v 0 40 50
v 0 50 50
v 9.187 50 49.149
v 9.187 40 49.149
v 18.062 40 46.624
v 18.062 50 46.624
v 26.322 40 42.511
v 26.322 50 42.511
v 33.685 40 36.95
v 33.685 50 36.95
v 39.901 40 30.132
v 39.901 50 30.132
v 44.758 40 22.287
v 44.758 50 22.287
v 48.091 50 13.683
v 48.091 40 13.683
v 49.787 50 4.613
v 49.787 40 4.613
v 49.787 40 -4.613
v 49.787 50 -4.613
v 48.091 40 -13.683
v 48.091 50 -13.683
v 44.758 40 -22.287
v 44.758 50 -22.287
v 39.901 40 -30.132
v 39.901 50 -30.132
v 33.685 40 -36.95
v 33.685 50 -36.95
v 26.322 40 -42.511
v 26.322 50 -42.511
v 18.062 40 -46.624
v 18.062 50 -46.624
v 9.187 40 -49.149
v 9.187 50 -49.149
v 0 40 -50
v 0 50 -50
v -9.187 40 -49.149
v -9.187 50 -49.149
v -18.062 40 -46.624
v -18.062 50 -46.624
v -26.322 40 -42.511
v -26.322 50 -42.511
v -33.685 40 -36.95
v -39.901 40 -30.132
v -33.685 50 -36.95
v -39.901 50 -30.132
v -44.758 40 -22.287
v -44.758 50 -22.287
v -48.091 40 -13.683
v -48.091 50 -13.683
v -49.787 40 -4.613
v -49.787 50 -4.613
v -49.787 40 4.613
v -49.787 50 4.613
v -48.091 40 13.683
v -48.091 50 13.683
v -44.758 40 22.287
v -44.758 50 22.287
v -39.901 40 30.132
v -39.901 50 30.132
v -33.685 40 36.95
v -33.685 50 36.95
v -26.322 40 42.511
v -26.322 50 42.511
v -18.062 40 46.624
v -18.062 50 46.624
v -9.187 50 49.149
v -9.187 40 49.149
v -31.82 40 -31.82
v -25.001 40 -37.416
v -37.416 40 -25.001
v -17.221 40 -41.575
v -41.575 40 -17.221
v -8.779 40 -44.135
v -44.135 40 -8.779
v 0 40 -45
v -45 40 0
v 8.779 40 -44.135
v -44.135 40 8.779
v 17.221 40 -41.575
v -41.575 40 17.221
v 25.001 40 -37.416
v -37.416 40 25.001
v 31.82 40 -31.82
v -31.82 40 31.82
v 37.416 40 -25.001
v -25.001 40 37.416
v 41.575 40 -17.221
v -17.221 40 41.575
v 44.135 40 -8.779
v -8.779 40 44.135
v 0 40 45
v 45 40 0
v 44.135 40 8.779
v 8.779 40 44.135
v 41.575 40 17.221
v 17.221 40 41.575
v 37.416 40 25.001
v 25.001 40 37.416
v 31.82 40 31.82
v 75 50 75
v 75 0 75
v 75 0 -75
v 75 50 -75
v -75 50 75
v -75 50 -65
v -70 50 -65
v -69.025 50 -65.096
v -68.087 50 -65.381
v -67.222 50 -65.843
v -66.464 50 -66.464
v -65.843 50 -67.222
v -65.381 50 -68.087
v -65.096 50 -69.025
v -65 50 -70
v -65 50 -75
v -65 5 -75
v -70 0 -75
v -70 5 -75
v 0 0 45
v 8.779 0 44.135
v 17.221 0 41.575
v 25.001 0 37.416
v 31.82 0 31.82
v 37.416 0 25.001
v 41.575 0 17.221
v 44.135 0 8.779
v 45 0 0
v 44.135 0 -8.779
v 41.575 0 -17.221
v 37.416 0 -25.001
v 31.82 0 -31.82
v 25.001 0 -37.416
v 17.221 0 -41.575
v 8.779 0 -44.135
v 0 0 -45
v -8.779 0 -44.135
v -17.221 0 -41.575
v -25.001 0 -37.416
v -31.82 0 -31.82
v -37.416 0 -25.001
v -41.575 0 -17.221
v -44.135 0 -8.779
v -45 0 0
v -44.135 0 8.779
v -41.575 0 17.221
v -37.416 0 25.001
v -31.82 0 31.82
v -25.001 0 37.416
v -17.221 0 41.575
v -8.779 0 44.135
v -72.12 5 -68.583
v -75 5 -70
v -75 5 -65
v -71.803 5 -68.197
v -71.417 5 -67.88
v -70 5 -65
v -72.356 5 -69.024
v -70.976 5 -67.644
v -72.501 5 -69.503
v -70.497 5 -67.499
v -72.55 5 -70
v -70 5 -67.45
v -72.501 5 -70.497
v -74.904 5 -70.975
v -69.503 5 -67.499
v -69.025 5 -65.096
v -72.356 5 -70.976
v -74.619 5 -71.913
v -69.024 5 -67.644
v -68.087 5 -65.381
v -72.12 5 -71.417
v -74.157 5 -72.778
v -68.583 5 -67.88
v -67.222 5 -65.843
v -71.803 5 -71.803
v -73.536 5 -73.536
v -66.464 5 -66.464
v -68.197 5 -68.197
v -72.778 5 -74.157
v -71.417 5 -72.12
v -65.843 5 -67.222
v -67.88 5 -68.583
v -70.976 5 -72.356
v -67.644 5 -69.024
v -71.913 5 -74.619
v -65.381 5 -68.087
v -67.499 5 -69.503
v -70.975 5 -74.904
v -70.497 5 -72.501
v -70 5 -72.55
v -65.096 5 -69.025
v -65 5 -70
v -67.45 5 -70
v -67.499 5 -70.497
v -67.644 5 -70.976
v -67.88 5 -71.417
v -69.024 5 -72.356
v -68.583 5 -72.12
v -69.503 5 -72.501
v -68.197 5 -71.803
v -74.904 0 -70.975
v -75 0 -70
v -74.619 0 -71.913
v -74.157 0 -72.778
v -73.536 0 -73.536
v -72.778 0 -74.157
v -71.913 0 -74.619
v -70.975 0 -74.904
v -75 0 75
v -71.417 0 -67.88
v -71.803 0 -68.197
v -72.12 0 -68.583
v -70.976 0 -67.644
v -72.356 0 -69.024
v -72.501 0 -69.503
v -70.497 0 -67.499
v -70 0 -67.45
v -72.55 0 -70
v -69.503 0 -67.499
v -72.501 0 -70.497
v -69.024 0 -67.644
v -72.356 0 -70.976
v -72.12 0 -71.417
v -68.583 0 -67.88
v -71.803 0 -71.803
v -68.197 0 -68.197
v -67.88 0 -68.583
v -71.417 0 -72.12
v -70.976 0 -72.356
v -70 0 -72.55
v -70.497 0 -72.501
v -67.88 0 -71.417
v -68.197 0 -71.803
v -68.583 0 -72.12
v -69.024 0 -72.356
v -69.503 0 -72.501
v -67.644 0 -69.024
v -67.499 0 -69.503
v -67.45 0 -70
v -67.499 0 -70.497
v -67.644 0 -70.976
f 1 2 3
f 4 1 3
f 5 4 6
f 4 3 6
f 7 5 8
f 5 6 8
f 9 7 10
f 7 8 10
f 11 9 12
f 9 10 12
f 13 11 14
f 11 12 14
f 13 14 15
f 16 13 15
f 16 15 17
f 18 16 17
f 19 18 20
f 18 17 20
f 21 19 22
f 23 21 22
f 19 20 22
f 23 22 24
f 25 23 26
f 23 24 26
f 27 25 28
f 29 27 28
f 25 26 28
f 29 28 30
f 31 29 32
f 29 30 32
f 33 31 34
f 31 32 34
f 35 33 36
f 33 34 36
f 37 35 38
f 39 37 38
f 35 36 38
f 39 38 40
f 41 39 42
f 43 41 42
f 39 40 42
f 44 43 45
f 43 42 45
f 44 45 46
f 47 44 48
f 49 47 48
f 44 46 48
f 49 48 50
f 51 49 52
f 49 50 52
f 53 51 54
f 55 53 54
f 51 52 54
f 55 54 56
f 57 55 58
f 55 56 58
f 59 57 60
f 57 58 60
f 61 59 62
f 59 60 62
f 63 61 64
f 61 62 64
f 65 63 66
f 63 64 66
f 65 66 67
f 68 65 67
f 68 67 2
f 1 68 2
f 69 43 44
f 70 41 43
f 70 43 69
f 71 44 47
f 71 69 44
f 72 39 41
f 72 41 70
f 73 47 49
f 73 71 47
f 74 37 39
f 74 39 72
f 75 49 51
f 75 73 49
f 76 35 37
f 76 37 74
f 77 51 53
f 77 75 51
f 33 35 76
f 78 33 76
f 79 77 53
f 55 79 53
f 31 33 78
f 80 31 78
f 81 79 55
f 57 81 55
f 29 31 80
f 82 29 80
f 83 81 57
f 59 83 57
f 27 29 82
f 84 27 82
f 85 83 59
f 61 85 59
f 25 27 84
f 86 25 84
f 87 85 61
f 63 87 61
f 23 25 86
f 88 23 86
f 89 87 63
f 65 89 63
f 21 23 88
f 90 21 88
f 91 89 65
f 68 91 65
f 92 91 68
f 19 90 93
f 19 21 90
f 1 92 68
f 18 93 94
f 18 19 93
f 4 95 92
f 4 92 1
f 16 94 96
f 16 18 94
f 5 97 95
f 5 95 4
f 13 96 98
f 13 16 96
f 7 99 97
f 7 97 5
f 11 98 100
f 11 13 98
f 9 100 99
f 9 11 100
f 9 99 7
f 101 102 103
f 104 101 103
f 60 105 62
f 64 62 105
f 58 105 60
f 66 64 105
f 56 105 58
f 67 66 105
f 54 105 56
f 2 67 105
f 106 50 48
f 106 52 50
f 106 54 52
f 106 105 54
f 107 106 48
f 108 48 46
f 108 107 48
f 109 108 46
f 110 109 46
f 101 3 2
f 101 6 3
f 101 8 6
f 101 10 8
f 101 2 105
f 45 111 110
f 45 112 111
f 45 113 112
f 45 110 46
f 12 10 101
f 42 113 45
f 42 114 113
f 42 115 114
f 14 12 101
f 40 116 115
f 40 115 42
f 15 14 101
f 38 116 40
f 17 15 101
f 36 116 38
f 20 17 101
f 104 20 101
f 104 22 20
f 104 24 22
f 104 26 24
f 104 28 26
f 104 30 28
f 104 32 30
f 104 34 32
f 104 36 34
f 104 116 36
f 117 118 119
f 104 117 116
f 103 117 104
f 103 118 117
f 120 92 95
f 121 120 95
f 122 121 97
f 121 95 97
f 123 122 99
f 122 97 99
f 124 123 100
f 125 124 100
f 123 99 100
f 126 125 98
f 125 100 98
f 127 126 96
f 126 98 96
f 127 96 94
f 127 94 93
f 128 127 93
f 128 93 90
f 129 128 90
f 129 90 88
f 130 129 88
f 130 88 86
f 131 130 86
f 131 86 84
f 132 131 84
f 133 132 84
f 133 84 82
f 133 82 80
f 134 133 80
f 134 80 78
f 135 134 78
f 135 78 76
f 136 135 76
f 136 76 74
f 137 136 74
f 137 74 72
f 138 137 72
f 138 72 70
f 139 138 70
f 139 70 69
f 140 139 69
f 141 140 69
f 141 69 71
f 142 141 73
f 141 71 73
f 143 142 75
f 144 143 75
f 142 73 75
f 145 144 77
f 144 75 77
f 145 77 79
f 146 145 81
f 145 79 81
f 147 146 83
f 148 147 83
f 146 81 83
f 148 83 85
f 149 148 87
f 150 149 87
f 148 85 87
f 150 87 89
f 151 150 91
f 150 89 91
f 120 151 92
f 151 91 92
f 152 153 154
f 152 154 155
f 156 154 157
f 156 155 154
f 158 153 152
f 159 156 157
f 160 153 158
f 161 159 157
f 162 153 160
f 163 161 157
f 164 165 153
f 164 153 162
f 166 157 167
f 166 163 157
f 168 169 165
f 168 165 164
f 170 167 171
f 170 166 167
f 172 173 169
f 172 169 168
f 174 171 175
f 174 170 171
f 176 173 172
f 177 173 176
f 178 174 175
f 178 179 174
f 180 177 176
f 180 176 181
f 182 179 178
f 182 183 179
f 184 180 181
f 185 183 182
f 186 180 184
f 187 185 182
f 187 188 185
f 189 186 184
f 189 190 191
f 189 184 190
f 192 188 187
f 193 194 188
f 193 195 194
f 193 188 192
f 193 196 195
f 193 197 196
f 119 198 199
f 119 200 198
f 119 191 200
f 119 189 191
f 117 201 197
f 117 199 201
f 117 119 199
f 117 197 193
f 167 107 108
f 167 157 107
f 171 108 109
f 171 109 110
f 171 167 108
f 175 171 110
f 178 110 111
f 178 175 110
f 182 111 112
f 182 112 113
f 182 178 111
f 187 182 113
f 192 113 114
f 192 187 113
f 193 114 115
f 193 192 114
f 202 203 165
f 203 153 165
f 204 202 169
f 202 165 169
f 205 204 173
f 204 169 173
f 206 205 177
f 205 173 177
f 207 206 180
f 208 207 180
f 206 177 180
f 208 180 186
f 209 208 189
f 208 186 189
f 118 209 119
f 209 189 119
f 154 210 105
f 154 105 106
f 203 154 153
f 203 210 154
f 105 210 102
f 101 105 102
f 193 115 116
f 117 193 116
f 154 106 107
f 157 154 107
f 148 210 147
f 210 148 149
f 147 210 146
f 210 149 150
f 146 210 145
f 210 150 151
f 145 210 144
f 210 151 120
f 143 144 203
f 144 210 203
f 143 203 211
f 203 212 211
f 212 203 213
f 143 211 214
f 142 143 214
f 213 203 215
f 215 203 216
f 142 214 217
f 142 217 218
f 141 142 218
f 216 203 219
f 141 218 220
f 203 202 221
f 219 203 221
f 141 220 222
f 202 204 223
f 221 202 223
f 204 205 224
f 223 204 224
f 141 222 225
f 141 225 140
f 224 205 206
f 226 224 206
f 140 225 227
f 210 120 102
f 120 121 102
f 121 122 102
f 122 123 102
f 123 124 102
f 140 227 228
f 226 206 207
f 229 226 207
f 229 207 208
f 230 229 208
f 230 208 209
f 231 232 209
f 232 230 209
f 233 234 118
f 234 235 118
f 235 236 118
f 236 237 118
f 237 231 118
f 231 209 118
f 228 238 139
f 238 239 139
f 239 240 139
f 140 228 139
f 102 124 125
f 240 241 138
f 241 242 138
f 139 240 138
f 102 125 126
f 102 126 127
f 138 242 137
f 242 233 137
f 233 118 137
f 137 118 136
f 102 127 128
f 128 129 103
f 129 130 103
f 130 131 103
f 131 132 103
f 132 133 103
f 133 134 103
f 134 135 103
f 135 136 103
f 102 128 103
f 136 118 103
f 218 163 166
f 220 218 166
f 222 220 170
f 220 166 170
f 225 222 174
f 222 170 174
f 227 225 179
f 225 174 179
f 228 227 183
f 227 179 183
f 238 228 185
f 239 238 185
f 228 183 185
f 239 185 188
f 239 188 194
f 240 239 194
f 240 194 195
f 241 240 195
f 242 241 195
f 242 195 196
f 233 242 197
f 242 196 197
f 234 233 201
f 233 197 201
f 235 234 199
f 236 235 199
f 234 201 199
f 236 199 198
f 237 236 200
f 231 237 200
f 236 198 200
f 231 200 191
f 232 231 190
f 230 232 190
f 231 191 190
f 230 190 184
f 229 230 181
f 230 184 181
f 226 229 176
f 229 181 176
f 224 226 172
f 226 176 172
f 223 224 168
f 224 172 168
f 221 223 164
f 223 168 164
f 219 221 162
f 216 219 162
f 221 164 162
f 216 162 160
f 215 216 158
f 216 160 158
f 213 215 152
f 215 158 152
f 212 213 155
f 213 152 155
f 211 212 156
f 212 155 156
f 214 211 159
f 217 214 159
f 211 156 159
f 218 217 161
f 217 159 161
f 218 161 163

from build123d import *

# Parameters (mm, degrees)
SKETCH1_W           = 150
SKETCH1_H           = 150
BOSS_EXTRUDE1_DEPTH = 50
SKETCH2_R           = 50
CUT_EXTRUDE1_DEPTH  = 10
SKETCH3_R           = 45
CUT_EXTRUDE2_DEPTH  = 114.357840488
SKETCH4_W           = 10
SKETCH4_H           = 10
CUT_EXTRUDE3_DEPTH  = 45
SKETCH6_R           = 2.55
CUT_EXTRUDE4_DEPTH  = 5
FILLET1_R           = 5


with BuildPart() as part:
    # Sketch1 → Boss-Extrude1 (new body)
    with BuildSketch(Plane(origin=(0, 0, 0), x_dir=(1, 0, 0), z_dir=(0, 1, 0))):
        Rectangle(SKETCH1_W, SKETCH1_H)
    extrude(amount=BOSS_EXTRUDE1_DEPTH)

    # Sketch2 → Cut-Extrude1 (cut)
    with BuildSketch(Plane(origin=(0, 50, 0), x_dir=(1, 0, 0), z_dir=(0, 1, 0))):
        with Locations(Location((0, 0, 0), (0, 0, 270))):
            Circle(SKETCH2_R)
    extrude(amount=-CUT_EXTRUDE1_DEPTH, mode=Mode.SUBTRACT)

    # Sketch3 → Cut-Extrude2 (cut, through all)
    with BuildSketch(Plane(origin=(0, 40, 0), x_dir=(1, 0, 0), z_dir=(0, 1, 0))):
        with Locations(Location((0, 0, 0), (0, 0, 270))):
            Circle(SKETCH3_R)
    extrude(amount=-CUT_EXTRUDE2_DEPTH, mode=Mode.SUBTRACT)

    # Sketch4 → Cut-Extrude3 (cut)
    with BuildSketch(Plane(origin=(0, 50, 0), x_dir=(1, 0, 0), z_dir=(0, 1, 0))):
        with Locations((-70, 70)):
            Rectangle(SKETCH4_W, SKETCH4_H)
    extrude(amount=-CUT_EXTRUDE3_DEPTH, mode=Mode.SUBTRACT)

    # Sketch6 → Cut-Extrude4 (cut)
    with BuildSketch(Plane(origin=(0, 5, 0), x_dir=(1, 0, 0), z_dir=(0, 1, 0))):
        with Locations(Location((-70, 70, 0), (0, 0, 270))):
            Circle(SKETCH6_R)
    extrude(amount=-CUT_EXTRUDE4_DEPTH, mode=Mode.SUBTRACT)

    # Fillet1
    fillet1_edges = [part.edges().sort_by_distance(p)[0] for p in [
        (-75, 2.5, -75),
        (-65, 27.5, -65),
    ]]
    fillet(fillet1_edges, radius=FILLET1_R)


solid = part.part
